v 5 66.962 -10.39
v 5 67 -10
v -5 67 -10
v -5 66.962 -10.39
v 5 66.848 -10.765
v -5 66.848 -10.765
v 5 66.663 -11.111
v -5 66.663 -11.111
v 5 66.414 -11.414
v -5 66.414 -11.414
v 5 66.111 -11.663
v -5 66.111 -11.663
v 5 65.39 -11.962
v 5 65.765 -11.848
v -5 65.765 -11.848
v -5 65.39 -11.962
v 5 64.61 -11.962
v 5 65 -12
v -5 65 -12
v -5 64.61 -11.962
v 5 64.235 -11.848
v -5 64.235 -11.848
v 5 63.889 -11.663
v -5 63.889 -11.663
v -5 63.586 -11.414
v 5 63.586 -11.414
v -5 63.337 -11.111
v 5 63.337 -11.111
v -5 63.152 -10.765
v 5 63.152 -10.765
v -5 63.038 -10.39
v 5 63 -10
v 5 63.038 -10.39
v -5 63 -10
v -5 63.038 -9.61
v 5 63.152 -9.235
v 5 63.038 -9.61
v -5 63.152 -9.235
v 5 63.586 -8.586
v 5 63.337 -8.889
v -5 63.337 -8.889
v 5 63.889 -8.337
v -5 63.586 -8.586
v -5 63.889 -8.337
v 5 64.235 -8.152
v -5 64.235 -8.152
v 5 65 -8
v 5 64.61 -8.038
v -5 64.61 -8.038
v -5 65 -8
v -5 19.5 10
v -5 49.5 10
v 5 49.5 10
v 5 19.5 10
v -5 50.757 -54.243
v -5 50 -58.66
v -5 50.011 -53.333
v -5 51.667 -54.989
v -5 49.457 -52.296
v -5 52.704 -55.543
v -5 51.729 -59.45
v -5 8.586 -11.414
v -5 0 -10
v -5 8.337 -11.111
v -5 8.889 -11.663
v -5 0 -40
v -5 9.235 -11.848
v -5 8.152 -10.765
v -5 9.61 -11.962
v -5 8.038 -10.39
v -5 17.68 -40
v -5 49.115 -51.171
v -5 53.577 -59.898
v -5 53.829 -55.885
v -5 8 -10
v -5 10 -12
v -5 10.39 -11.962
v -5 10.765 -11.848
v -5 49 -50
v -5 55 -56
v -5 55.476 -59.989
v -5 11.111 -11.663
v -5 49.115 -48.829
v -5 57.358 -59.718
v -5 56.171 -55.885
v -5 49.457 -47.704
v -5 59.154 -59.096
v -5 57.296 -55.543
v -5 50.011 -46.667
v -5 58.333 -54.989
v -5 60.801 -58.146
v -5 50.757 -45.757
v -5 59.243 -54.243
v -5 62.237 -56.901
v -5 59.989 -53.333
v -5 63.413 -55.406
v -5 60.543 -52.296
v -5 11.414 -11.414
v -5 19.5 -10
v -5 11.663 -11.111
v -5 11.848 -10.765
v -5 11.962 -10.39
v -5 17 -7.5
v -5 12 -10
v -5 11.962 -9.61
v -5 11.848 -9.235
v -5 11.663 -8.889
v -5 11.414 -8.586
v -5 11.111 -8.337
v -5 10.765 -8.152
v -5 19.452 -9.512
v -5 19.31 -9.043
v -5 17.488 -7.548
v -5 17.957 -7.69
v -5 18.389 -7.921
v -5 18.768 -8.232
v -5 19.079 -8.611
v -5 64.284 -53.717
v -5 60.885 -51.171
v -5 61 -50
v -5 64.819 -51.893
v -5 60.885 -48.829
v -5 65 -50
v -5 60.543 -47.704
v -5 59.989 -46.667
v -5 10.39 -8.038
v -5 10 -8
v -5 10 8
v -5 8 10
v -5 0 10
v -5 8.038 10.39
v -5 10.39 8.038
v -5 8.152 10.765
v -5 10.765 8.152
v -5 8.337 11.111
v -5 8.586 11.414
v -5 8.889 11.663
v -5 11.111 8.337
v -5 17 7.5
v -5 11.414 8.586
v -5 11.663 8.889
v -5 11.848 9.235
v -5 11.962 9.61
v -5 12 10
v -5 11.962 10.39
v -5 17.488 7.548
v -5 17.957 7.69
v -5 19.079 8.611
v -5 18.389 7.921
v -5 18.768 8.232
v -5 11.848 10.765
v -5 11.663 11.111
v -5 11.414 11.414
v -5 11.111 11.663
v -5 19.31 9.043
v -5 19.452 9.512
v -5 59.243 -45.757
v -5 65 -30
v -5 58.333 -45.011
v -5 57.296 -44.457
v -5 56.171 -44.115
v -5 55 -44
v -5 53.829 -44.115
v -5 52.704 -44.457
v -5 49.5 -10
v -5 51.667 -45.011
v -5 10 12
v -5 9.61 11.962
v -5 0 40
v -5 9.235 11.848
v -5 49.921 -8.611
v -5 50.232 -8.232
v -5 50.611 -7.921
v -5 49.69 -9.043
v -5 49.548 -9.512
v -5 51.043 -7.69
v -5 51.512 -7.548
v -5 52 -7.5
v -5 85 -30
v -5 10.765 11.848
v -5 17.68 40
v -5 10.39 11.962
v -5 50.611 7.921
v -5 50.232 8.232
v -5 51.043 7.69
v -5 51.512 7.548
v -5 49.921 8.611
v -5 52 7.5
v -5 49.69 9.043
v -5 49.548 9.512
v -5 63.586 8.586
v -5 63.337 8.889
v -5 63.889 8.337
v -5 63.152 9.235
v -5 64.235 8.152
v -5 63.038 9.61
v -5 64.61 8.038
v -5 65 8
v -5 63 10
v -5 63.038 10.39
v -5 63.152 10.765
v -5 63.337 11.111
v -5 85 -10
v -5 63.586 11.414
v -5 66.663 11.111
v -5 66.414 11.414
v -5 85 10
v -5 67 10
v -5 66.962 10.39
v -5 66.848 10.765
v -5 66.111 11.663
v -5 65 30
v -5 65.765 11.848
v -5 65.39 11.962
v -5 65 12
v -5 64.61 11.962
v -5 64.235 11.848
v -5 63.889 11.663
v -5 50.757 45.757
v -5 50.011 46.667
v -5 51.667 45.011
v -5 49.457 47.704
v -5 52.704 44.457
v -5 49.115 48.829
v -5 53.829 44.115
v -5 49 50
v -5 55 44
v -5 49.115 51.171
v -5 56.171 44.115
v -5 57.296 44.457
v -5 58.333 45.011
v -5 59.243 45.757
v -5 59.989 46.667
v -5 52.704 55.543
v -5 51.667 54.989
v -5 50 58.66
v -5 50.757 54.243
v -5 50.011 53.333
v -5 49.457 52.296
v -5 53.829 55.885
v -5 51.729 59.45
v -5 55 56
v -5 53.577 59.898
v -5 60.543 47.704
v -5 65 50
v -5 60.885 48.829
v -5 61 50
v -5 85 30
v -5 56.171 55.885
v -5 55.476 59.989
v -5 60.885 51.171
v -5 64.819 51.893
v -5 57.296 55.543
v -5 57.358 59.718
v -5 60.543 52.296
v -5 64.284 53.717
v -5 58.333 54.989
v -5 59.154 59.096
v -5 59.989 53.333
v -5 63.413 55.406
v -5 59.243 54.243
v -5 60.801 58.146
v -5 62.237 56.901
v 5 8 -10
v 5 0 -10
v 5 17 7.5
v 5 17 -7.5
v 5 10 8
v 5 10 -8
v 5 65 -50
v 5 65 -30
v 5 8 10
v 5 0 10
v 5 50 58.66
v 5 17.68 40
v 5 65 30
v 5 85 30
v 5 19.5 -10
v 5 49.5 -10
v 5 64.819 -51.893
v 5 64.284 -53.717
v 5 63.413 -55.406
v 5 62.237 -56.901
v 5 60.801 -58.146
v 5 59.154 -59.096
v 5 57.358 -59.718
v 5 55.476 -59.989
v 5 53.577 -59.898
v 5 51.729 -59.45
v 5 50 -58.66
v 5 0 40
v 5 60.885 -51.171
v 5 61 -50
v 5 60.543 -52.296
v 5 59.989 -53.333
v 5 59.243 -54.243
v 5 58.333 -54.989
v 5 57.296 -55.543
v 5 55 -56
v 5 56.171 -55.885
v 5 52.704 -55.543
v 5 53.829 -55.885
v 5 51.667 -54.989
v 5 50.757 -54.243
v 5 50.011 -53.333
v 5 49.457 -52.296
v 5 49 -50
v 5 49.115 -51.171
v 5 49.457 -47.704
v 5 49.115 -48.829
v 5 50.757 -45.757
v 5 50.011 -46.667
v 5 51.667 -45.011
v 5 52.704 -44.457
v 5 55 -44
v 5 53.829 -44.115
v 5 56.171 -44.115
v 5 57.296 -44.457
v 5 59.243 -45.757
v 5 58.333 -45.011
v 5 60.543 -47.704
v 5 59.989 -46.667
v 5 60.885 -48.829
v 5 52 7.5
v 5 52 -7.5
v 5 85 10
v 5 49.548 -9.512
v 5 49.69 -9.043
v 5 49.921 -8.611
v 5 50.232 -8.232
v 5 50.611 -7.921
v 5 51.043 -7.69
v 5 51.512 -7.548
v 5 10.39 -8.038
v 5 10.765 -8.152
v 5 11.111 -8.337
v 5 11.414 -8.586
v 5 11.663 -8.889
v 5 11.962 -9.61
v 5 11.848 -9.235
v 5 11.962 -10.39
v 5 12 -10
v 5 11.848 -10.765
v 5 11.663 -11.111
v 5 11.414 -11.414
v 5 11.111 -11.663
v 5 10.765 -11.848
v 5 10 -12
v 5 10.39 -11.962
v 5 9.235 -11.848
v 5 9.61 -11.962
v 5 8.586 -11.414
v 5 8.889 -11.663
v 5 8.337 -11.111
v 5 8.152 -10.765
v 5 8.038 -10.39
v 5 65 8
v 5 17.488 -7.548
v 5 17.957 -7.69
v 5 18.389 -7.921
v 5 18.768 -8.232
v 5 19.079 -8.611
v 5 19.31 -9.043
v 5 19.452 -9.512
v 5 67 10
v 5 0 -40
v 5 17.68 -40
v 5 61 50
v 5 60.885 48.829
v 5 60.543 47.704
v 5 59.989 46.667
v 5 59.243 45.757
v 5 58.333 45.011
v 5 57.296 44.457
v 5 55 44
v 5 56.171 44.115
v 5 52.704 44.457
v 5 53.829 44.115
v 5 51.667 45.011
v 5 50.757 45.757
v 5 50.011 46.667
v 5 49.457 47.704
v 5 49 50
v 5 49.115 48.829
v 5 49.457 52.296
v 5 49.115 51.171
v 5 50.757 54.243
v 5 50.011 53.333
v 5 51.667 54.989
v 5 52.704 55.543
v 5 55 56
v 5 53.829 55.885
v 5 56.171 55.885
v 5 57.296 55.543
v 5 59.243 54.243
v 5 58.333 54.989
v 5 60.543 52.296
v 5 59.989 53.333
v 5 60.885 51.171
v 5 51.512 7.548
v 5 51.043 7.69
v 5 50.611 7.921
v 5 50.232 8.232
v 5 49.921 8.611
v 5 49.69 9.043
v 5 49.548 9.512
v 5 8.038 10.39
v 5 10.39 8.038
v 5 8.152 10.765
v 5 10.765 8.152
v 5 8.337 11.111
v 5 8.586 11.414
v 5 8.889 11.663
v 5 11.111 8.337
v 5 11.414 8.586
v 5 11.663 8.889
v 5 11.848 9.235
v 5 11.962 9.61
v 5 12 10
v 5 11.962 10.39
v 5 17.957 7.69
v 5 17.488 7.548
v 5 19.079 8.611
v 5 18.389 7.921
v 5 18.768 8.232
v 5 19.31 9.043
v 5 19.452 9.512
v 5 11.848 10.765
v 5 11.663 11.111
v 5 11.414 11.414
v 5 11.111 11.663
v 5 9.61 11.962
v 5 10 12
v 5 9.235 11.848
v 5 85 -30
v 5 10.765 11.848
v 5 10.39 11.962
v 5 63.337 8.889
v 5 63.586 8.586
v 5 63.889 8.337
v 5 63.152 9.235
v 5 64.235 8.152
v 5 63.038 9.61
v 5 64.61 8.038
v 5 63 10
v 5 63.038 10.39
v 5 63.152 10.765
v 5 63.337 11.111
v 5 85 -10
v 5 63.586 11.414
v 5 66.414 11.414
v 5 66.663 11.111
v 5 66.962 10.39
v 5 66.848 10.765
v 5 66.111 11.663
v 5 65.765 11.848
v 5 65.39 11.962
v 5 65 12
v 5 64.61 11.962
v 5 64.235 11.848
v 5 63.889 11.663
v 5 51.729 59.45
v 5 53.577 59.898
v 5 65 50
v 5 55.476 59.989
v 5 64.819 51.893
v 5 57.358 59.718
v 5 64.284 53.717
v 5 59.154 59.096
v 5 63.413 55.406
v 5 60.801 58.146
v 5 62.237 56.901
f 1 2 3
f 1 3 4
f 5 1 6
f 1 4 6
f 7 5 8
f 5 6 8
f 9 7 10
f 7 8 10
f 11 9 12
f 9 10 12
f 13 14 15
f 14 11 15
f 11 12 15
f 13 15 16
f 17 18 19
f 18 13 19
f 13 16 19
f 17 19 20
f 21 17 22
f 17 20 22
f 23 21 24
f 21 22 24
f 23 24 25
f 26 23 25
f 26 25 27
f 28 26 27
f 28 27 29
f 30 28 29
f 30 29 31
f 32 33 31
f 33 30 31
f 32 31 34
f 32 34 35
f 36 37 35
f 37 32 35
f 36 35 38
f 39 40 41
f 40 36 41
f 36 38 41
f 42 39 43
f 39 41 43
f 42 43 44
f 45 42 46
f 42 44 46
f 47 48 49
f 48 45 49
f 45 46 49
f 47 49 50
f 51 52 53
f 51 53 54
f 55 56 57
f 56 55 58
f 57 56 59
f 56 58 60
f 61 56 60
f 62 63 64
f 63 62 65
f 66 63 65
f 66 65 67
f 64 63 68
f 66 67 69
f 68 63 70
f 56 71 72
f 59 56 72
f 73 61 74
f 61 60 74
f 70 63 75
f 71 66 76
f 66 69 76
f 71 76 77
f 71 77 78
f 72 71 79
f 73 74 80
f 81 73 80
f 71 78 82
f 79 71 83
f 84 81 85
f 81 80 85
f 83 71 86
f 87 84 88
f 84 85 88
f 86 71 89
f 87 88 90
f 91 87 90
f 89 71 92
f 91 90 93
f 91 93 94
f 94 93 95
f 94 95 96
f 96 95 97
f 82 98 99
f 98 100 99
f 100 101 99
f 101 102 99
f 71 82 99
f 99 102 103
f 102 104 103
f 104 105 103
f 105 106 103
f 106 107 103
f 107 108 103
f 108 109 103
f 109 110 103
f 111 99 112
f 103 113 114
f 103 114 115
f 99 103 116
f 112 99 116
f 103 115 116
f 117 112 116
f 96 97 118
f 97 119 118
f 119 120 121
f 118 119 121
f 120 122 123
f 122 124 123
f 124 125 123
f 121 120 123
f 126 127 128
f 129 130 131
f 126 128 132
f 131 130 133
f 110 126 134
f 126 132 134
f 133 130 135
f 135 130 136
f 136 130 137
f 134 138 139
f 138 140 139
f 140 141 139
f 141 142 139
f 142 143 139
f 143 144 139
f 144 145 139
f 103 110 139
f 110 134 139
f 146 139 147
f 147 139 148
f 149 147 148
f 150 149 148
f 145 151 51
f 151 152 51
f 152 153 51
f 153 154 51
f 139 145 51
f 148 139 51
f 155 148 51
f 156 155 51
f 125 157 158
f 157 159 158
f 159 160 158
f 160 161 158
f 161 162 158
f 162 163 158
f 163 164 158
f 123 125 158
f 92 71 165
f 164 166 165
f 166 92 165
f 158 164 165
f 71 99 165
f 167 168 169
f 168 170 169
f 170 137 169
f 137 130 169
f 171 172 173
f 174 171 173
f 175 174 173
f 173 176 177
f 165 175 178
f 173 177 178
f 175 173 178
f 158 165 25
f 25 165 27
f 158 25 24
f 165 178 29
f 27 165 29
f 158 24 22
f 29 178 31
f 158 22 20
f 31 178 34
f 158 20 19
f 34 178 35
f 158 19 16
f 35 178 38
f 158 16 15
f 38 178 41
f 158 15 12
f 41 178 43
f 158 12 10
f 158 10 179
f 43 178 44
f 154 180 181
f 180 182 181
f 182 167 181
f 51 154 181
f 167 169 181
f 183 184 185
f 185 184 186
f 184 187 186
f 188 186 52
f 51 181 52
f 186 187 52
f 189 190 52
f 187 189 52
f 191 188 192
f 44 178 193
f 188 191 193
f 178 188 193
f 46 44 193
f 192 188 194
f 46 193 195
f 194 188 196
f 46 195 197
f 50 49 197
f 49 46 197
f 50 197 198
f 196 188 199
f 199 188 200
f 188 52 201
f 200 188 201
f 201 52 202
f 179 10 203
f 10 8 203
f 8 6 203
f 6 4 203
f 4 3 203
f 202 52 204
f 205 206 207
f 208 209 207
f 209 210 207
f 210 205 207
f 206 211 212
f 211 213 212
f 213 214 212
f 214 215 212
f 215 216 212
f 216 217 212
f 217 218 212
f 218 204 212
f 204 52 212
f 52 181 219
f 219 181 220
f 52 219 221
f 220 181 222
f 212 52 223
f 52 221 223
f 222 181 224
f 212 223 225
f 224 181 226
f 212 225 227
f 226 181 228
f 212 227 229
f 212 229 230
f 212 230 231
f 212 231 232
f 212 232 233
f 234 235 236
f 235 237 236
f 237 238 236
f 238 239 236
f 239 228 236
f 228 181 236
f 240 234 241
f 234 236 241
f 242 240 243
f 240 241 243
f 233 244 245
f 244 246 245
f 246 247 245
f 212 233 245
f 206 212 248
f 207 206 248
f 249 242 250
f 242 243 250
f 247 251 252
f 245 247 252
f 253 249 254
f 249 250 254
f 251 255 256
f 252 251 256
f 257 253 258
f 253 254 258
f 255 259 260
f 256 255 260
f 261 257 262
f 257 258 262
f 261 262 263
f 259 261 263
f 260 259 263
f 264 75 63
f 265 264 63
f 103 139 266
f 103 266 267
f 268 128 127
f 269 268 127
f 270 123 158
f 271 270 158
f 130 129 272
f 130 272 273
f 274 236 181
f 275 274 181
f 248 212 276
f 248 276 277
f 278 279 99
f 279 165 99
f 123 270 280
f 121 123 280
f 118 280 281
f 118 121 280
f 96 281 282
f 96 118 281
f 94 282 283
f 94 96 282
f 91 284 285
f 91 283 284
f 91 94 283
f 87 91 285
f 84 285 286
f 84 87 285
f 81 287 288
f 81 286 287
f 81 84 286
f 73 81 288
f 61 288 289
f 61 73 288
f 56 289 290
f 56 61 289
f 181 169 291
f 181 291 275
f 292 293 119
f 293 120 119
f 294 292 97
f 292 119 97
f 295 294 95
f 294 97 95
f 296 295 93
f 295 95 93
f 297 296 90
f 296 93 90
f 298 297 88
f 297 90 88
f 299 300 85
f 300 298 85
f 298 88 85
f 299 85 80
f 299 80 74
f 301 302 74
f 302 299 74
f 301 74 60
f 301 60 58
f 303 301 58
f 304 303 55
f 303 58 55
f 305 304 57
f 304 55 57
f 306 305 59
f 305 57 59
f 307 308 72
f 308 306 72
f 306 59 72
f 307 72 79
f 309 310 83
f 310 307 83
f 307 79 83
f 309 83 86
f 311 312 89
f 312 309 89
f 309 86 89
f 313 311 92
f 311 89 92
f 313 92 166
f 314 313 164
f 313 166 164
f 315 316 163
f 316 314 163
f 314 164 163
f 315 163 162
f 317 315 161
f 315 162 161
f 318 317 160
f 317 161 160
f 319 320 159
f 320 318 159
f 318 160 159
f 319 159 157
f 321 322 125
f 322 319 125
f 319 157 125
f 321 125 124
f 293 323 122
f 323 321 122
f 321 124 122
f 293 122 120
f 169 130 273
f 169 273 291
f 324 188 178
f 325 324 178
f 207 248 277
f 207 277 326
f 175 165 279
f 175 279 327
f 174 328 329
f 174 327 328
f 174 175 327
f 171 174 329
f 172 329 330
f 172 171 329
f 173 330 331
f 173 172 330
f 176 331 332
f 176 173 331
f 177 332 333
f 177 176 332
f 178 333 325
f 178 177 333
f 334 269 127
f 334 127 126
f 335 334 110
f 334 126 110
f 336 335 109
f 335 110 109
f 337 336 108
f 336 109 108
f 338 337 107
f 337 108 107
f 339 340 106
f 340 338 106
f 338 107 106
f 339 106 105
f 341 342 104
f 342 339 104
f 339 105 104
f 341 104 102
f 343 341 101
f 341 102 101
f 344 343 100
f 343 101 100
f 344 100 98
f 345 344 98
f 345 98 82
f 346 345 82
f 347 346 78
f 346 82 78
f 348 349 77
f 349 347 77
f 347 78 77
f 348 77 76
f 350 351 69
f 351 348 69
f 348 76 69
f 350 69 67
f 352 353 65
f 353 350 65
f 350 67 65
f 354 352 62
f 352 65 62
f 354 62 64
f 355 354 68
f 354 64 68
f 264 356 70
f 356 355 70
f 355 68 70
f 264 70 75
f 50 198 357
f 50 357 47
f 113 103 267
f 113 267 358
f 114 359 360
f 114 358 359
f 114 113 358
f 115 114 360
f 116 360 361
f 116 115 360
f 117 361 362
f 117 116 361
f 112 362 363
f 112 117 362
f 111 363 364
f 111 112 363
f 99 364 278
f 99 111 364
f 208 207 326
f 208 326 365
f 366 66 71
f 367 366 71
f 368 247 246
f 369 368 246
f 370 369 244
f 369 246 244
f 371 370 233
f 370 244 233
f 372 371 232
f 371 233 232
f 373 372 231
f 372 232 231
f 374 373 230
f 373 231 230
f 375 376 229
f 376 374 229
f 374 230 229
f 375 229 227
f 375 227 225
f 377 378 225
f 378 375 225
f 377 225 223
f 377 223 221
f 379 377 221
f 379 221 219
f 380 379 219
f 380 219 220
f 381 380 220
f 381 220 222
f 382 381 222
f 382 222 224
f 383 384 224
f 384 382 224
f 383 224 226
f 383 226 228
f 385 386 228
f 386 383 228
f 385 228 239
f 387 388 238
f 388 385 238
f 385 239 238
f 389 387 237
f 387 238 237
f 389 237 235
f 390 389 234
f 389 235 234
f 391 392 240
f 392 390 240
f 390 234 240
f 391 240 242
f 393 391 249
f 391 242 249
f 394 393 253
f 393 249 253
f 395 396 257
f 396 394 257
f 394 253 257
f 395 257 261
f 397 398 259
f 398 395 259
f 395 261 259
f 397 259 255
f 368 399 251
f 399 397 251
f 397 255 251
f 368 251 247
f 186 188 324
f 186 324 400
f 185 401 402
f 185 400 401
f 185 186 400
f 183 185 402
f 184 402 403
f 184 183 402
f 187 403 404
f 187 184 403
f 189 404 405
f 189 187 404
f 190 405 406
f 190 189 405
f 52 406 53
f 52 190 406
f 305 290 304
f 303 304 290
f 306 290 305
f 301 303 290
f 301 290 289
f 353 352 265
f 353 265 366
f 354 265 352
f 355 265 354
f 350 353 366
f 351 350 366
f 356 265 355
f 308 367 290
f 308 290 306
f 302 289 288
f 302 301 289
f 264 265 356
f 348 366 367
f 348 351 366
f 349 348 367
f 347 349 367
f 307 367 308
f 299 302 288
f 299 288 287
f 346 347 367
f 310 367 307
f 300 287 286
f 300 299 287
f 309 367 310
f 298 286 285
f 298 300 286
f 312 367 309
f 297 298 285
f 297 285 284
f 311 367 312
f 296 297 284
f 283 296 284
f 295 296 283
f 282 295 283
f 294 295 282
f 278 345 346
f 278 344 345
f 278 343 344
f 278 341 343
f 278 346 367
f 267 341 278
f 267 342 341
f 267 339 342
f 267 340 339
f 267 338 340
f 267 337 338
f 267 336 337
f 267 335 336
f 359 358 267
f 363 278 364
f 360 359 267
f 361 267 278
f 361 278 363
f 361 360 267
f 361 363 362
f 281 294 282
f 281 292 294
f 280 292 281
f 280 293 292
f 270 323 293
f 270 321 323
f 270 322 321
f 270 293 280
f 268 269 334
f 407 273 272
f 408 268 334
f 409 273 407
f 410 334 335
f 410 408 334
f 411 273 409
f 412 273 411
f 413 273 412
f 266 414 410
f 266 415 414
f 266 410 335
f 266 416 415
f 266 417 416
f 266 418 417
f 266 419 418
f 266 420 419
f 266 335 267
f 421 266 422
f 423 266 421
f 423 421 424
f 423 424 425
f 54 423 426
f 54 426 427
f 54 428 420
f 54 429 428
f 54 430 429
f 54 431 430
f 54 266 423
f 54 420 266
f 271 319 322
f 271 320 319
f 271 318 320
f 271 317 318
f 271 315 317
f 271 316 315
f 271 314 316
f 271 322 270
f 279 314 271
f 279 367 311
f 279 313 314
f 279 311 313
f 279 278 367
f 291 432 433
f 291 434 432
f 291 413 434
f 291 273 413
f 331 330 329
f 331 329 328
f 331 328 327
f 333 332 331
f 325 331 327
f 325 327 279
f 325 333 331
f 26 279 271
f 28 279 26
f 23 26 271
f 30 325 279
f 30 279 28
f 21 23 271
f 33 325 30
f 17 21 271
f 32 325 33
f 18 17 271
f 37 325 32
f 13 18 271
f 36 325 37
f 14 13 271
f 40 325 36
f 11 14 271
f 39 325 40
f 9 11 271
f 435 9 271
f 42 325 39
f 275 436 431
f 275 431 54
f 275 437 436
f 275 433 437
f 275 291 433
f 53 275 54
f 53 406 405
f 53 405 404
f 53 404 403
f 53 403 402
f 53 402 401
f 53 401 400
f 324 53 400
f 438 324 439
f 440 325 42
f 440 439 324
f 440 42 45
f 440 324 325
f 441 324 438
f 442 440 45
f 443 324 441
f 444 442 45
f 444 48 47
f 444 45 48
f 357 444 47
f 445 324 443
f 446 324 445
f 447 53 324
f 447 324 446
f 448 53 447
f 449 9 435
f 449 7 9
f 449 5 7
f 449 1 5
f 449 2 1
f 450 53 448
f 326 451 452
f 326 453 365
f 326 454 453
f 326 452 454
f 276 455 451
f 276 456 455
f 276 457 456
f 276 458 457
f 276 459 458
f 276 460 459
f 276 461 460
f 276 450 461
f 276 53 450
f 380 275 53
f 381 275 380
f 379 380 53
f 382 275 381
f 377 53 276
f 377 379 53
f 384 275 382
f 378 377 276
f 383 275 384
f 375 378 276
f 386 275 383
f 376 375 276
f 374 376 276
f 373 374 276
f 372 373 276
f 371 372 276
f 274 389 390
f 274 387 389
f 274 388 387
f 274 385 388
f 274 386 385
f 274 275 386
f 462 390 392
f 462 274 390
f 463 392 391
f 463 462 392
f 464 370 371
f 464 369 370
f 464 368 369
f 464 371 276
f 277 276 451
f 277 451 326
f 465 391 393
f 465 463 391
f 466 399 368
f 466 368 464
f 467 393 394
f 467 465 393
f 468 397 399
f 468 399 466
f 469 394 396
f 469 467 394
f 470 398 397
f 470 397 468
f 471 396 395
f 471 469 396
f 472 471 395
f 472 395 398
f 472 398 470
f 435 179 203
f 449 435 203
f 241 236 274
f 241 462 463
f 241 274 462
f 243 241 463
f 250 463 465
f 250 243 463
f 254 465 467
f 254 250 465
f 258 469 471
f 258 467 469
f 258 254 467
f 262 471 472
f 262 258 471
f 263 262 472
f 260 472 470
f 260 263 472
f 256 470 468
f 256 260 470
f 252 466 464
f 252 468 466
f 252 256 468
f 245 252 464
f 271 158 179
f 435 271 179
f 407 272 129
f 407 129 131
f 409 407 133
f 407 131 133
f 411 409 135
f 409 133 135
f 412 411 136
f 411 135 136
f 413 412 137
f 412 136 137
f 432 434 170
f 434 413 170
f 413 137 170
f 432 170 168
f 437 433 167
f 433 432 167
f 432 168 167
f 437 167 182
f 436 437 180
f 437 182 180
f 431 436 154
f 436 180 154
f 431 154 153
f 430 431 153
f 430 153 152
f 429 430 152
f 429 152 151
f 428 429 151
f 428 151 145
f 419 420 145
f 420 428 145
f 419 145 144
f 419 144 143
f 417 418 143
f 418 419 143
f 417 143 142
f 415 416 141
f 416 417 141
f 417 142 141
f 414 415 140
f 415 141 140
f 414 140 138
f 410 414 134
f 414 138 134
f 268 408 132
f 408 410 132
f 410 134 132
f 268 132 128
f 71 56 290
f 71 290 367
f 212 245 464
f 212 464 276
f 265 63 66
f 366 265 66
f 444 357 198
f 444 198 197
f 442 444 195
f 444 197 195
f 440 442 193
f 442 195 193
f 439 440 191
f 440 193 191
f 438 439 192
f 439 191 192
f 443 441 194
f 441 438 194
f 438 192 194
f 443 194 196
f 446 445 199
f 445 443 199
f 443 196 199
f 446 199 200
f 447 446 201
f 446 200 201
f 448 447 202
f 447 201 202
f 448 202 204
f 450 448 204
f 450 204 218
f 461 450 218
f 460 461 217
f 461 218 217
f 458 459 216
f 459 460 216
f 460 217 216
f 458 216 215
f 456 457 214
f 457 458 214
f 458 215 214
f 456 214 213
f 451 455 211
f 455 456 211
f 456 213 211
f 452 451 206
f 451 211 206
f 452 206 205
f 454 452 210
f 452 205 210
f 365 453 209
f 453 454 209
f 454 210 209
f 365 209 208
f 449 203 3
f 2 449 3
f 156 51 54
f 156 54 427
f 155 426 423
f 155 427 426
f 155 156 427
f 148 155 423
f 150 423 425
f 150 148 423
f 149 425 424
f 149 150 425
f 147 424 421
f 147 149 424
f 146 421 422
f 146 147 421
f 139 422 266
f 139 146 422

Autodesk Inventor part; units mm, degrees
ref_plane "YZ Plane" through (0, 0, 0) normal (1, 0, 0) x (0, 1, 0)
ref_plane "XZ Plane" through (0, 0, 0) normal (0, 1, 0) x (-1, 0, 0)
ref_plane "XY Plane" through (0, 0, 0) normal (0, 0, 1) x (1, 0, 0)
sketch "Sketch1" plane through (0, 0, 0) normal (1, 0, 0) x (0, 1, 0)
  line L0 (8, 10) -> (0, 10)
  line L1 (0, 10) -> (0, 40)
  line L2 (0, 40) -> (17.6795, 40)
  arc A0 (65, 50) -> (50, 58.6603) centre (55, 50) ccw
  line L3 (65, 50) -> (65, 40)
  line L4 (61.5, 0) -> (66, 0)
  line L5 (65, 40) -> (65, 30)
  line L6 (65, 30) -> (85, 30)
  line L7 (85, 30) -> (85, 10)
  line L8 (10, 8) -> (10, 0)
  line L9 (50, 58.6603) -> (17.6795, 40)
  circle A1 centre (55, 50) radius 6
  line L10 (85, 10) -> (67, 10)
  line L11 (65, 8) -> (65, 0)
  line L12 (49.5, 10) -> (19.5, 10)
  line L13 (17, 7.5) -> (17, 0)
  line L14 (17, 0) -> (52, 0)
  line L15 (52, 0) -> (52, 7.5)
  arc A2 (67, 10) -> (65, 8) centre (65, 10) ccw
  arc A3 (49.5, 10) -> (52, 7.5) centre (52, 10) ccw
  arc A4 (17, 7.5) -> (19.5, 10) centre (17, 10) ccw
  arc A5 (10, 8) -> (8, 10) centre (10, 10) ccw
  line L16 (65, -40) -> (65, -30)
  arc A6 (52, -7.5) -> (49.5, -10) centre (52, -10) ccw
  line L17 (52, 0) -> (52, -7.5)
  line L18 (65, -50) -> (65, -40)
  arc A7 (50, -58.6603) -> (65, -50) centre (55, -50) ccw
  line L19 (49.5, -10) -> (19.5, -10)
  line L20 (50, -58.6603) -> (17.6795, -40)
  arc A8 (19.5, -10) -> (17, -7.5) centre (17, -10) ccw
  circle A9 centre (55, -50) radius 6
  line L21 (8, -10) -> (0, -10)
  line L22 (0, -10) -> (0, -40)
  line L23 (0, -40) -> (17.6795, -40)
  line L24 (17, -7.5) -> (17, 0)
  arc A10 (8, -10) -> (10, -8) centre (10, -10) ccw
  line L25 (10, -8) -> (10, 0)
  line L26 (65, -30) -> (85, -30)
  line L27 (85, -30) -> (85, -10)
  line L28 (65, -8) -> (65, 0)
  arc A11 (65, -8) -> (67, -10) centre (65, -10) ccw
  line L29 (85, -10) -> (67, -10)
  line L30 (17.6795, 40) -> (28.4601, 40)
  point P0 (0, 0)
  point P1 (0, 0)
  dimension "d21" = 35
  dimension "d22" = 55
  dimension "d23" = 85
  dimension "d24" = 12
  dimension "d25" = 2.5
  dimension "d26" = 20
  dimension "d27" = 80
  dimension "d28" = 20
  dimension "d29" = 100
  dimension "d32" = 30
sketch "Sketch2" plane through (0, 0, 0) normal (1, 0, 0) x (0, 1, 0)
  point P0 (0, 0)
extrude "Extrusion1" add sketch "Sketch1" along normal mid plane 10
properties part number "hw8"
